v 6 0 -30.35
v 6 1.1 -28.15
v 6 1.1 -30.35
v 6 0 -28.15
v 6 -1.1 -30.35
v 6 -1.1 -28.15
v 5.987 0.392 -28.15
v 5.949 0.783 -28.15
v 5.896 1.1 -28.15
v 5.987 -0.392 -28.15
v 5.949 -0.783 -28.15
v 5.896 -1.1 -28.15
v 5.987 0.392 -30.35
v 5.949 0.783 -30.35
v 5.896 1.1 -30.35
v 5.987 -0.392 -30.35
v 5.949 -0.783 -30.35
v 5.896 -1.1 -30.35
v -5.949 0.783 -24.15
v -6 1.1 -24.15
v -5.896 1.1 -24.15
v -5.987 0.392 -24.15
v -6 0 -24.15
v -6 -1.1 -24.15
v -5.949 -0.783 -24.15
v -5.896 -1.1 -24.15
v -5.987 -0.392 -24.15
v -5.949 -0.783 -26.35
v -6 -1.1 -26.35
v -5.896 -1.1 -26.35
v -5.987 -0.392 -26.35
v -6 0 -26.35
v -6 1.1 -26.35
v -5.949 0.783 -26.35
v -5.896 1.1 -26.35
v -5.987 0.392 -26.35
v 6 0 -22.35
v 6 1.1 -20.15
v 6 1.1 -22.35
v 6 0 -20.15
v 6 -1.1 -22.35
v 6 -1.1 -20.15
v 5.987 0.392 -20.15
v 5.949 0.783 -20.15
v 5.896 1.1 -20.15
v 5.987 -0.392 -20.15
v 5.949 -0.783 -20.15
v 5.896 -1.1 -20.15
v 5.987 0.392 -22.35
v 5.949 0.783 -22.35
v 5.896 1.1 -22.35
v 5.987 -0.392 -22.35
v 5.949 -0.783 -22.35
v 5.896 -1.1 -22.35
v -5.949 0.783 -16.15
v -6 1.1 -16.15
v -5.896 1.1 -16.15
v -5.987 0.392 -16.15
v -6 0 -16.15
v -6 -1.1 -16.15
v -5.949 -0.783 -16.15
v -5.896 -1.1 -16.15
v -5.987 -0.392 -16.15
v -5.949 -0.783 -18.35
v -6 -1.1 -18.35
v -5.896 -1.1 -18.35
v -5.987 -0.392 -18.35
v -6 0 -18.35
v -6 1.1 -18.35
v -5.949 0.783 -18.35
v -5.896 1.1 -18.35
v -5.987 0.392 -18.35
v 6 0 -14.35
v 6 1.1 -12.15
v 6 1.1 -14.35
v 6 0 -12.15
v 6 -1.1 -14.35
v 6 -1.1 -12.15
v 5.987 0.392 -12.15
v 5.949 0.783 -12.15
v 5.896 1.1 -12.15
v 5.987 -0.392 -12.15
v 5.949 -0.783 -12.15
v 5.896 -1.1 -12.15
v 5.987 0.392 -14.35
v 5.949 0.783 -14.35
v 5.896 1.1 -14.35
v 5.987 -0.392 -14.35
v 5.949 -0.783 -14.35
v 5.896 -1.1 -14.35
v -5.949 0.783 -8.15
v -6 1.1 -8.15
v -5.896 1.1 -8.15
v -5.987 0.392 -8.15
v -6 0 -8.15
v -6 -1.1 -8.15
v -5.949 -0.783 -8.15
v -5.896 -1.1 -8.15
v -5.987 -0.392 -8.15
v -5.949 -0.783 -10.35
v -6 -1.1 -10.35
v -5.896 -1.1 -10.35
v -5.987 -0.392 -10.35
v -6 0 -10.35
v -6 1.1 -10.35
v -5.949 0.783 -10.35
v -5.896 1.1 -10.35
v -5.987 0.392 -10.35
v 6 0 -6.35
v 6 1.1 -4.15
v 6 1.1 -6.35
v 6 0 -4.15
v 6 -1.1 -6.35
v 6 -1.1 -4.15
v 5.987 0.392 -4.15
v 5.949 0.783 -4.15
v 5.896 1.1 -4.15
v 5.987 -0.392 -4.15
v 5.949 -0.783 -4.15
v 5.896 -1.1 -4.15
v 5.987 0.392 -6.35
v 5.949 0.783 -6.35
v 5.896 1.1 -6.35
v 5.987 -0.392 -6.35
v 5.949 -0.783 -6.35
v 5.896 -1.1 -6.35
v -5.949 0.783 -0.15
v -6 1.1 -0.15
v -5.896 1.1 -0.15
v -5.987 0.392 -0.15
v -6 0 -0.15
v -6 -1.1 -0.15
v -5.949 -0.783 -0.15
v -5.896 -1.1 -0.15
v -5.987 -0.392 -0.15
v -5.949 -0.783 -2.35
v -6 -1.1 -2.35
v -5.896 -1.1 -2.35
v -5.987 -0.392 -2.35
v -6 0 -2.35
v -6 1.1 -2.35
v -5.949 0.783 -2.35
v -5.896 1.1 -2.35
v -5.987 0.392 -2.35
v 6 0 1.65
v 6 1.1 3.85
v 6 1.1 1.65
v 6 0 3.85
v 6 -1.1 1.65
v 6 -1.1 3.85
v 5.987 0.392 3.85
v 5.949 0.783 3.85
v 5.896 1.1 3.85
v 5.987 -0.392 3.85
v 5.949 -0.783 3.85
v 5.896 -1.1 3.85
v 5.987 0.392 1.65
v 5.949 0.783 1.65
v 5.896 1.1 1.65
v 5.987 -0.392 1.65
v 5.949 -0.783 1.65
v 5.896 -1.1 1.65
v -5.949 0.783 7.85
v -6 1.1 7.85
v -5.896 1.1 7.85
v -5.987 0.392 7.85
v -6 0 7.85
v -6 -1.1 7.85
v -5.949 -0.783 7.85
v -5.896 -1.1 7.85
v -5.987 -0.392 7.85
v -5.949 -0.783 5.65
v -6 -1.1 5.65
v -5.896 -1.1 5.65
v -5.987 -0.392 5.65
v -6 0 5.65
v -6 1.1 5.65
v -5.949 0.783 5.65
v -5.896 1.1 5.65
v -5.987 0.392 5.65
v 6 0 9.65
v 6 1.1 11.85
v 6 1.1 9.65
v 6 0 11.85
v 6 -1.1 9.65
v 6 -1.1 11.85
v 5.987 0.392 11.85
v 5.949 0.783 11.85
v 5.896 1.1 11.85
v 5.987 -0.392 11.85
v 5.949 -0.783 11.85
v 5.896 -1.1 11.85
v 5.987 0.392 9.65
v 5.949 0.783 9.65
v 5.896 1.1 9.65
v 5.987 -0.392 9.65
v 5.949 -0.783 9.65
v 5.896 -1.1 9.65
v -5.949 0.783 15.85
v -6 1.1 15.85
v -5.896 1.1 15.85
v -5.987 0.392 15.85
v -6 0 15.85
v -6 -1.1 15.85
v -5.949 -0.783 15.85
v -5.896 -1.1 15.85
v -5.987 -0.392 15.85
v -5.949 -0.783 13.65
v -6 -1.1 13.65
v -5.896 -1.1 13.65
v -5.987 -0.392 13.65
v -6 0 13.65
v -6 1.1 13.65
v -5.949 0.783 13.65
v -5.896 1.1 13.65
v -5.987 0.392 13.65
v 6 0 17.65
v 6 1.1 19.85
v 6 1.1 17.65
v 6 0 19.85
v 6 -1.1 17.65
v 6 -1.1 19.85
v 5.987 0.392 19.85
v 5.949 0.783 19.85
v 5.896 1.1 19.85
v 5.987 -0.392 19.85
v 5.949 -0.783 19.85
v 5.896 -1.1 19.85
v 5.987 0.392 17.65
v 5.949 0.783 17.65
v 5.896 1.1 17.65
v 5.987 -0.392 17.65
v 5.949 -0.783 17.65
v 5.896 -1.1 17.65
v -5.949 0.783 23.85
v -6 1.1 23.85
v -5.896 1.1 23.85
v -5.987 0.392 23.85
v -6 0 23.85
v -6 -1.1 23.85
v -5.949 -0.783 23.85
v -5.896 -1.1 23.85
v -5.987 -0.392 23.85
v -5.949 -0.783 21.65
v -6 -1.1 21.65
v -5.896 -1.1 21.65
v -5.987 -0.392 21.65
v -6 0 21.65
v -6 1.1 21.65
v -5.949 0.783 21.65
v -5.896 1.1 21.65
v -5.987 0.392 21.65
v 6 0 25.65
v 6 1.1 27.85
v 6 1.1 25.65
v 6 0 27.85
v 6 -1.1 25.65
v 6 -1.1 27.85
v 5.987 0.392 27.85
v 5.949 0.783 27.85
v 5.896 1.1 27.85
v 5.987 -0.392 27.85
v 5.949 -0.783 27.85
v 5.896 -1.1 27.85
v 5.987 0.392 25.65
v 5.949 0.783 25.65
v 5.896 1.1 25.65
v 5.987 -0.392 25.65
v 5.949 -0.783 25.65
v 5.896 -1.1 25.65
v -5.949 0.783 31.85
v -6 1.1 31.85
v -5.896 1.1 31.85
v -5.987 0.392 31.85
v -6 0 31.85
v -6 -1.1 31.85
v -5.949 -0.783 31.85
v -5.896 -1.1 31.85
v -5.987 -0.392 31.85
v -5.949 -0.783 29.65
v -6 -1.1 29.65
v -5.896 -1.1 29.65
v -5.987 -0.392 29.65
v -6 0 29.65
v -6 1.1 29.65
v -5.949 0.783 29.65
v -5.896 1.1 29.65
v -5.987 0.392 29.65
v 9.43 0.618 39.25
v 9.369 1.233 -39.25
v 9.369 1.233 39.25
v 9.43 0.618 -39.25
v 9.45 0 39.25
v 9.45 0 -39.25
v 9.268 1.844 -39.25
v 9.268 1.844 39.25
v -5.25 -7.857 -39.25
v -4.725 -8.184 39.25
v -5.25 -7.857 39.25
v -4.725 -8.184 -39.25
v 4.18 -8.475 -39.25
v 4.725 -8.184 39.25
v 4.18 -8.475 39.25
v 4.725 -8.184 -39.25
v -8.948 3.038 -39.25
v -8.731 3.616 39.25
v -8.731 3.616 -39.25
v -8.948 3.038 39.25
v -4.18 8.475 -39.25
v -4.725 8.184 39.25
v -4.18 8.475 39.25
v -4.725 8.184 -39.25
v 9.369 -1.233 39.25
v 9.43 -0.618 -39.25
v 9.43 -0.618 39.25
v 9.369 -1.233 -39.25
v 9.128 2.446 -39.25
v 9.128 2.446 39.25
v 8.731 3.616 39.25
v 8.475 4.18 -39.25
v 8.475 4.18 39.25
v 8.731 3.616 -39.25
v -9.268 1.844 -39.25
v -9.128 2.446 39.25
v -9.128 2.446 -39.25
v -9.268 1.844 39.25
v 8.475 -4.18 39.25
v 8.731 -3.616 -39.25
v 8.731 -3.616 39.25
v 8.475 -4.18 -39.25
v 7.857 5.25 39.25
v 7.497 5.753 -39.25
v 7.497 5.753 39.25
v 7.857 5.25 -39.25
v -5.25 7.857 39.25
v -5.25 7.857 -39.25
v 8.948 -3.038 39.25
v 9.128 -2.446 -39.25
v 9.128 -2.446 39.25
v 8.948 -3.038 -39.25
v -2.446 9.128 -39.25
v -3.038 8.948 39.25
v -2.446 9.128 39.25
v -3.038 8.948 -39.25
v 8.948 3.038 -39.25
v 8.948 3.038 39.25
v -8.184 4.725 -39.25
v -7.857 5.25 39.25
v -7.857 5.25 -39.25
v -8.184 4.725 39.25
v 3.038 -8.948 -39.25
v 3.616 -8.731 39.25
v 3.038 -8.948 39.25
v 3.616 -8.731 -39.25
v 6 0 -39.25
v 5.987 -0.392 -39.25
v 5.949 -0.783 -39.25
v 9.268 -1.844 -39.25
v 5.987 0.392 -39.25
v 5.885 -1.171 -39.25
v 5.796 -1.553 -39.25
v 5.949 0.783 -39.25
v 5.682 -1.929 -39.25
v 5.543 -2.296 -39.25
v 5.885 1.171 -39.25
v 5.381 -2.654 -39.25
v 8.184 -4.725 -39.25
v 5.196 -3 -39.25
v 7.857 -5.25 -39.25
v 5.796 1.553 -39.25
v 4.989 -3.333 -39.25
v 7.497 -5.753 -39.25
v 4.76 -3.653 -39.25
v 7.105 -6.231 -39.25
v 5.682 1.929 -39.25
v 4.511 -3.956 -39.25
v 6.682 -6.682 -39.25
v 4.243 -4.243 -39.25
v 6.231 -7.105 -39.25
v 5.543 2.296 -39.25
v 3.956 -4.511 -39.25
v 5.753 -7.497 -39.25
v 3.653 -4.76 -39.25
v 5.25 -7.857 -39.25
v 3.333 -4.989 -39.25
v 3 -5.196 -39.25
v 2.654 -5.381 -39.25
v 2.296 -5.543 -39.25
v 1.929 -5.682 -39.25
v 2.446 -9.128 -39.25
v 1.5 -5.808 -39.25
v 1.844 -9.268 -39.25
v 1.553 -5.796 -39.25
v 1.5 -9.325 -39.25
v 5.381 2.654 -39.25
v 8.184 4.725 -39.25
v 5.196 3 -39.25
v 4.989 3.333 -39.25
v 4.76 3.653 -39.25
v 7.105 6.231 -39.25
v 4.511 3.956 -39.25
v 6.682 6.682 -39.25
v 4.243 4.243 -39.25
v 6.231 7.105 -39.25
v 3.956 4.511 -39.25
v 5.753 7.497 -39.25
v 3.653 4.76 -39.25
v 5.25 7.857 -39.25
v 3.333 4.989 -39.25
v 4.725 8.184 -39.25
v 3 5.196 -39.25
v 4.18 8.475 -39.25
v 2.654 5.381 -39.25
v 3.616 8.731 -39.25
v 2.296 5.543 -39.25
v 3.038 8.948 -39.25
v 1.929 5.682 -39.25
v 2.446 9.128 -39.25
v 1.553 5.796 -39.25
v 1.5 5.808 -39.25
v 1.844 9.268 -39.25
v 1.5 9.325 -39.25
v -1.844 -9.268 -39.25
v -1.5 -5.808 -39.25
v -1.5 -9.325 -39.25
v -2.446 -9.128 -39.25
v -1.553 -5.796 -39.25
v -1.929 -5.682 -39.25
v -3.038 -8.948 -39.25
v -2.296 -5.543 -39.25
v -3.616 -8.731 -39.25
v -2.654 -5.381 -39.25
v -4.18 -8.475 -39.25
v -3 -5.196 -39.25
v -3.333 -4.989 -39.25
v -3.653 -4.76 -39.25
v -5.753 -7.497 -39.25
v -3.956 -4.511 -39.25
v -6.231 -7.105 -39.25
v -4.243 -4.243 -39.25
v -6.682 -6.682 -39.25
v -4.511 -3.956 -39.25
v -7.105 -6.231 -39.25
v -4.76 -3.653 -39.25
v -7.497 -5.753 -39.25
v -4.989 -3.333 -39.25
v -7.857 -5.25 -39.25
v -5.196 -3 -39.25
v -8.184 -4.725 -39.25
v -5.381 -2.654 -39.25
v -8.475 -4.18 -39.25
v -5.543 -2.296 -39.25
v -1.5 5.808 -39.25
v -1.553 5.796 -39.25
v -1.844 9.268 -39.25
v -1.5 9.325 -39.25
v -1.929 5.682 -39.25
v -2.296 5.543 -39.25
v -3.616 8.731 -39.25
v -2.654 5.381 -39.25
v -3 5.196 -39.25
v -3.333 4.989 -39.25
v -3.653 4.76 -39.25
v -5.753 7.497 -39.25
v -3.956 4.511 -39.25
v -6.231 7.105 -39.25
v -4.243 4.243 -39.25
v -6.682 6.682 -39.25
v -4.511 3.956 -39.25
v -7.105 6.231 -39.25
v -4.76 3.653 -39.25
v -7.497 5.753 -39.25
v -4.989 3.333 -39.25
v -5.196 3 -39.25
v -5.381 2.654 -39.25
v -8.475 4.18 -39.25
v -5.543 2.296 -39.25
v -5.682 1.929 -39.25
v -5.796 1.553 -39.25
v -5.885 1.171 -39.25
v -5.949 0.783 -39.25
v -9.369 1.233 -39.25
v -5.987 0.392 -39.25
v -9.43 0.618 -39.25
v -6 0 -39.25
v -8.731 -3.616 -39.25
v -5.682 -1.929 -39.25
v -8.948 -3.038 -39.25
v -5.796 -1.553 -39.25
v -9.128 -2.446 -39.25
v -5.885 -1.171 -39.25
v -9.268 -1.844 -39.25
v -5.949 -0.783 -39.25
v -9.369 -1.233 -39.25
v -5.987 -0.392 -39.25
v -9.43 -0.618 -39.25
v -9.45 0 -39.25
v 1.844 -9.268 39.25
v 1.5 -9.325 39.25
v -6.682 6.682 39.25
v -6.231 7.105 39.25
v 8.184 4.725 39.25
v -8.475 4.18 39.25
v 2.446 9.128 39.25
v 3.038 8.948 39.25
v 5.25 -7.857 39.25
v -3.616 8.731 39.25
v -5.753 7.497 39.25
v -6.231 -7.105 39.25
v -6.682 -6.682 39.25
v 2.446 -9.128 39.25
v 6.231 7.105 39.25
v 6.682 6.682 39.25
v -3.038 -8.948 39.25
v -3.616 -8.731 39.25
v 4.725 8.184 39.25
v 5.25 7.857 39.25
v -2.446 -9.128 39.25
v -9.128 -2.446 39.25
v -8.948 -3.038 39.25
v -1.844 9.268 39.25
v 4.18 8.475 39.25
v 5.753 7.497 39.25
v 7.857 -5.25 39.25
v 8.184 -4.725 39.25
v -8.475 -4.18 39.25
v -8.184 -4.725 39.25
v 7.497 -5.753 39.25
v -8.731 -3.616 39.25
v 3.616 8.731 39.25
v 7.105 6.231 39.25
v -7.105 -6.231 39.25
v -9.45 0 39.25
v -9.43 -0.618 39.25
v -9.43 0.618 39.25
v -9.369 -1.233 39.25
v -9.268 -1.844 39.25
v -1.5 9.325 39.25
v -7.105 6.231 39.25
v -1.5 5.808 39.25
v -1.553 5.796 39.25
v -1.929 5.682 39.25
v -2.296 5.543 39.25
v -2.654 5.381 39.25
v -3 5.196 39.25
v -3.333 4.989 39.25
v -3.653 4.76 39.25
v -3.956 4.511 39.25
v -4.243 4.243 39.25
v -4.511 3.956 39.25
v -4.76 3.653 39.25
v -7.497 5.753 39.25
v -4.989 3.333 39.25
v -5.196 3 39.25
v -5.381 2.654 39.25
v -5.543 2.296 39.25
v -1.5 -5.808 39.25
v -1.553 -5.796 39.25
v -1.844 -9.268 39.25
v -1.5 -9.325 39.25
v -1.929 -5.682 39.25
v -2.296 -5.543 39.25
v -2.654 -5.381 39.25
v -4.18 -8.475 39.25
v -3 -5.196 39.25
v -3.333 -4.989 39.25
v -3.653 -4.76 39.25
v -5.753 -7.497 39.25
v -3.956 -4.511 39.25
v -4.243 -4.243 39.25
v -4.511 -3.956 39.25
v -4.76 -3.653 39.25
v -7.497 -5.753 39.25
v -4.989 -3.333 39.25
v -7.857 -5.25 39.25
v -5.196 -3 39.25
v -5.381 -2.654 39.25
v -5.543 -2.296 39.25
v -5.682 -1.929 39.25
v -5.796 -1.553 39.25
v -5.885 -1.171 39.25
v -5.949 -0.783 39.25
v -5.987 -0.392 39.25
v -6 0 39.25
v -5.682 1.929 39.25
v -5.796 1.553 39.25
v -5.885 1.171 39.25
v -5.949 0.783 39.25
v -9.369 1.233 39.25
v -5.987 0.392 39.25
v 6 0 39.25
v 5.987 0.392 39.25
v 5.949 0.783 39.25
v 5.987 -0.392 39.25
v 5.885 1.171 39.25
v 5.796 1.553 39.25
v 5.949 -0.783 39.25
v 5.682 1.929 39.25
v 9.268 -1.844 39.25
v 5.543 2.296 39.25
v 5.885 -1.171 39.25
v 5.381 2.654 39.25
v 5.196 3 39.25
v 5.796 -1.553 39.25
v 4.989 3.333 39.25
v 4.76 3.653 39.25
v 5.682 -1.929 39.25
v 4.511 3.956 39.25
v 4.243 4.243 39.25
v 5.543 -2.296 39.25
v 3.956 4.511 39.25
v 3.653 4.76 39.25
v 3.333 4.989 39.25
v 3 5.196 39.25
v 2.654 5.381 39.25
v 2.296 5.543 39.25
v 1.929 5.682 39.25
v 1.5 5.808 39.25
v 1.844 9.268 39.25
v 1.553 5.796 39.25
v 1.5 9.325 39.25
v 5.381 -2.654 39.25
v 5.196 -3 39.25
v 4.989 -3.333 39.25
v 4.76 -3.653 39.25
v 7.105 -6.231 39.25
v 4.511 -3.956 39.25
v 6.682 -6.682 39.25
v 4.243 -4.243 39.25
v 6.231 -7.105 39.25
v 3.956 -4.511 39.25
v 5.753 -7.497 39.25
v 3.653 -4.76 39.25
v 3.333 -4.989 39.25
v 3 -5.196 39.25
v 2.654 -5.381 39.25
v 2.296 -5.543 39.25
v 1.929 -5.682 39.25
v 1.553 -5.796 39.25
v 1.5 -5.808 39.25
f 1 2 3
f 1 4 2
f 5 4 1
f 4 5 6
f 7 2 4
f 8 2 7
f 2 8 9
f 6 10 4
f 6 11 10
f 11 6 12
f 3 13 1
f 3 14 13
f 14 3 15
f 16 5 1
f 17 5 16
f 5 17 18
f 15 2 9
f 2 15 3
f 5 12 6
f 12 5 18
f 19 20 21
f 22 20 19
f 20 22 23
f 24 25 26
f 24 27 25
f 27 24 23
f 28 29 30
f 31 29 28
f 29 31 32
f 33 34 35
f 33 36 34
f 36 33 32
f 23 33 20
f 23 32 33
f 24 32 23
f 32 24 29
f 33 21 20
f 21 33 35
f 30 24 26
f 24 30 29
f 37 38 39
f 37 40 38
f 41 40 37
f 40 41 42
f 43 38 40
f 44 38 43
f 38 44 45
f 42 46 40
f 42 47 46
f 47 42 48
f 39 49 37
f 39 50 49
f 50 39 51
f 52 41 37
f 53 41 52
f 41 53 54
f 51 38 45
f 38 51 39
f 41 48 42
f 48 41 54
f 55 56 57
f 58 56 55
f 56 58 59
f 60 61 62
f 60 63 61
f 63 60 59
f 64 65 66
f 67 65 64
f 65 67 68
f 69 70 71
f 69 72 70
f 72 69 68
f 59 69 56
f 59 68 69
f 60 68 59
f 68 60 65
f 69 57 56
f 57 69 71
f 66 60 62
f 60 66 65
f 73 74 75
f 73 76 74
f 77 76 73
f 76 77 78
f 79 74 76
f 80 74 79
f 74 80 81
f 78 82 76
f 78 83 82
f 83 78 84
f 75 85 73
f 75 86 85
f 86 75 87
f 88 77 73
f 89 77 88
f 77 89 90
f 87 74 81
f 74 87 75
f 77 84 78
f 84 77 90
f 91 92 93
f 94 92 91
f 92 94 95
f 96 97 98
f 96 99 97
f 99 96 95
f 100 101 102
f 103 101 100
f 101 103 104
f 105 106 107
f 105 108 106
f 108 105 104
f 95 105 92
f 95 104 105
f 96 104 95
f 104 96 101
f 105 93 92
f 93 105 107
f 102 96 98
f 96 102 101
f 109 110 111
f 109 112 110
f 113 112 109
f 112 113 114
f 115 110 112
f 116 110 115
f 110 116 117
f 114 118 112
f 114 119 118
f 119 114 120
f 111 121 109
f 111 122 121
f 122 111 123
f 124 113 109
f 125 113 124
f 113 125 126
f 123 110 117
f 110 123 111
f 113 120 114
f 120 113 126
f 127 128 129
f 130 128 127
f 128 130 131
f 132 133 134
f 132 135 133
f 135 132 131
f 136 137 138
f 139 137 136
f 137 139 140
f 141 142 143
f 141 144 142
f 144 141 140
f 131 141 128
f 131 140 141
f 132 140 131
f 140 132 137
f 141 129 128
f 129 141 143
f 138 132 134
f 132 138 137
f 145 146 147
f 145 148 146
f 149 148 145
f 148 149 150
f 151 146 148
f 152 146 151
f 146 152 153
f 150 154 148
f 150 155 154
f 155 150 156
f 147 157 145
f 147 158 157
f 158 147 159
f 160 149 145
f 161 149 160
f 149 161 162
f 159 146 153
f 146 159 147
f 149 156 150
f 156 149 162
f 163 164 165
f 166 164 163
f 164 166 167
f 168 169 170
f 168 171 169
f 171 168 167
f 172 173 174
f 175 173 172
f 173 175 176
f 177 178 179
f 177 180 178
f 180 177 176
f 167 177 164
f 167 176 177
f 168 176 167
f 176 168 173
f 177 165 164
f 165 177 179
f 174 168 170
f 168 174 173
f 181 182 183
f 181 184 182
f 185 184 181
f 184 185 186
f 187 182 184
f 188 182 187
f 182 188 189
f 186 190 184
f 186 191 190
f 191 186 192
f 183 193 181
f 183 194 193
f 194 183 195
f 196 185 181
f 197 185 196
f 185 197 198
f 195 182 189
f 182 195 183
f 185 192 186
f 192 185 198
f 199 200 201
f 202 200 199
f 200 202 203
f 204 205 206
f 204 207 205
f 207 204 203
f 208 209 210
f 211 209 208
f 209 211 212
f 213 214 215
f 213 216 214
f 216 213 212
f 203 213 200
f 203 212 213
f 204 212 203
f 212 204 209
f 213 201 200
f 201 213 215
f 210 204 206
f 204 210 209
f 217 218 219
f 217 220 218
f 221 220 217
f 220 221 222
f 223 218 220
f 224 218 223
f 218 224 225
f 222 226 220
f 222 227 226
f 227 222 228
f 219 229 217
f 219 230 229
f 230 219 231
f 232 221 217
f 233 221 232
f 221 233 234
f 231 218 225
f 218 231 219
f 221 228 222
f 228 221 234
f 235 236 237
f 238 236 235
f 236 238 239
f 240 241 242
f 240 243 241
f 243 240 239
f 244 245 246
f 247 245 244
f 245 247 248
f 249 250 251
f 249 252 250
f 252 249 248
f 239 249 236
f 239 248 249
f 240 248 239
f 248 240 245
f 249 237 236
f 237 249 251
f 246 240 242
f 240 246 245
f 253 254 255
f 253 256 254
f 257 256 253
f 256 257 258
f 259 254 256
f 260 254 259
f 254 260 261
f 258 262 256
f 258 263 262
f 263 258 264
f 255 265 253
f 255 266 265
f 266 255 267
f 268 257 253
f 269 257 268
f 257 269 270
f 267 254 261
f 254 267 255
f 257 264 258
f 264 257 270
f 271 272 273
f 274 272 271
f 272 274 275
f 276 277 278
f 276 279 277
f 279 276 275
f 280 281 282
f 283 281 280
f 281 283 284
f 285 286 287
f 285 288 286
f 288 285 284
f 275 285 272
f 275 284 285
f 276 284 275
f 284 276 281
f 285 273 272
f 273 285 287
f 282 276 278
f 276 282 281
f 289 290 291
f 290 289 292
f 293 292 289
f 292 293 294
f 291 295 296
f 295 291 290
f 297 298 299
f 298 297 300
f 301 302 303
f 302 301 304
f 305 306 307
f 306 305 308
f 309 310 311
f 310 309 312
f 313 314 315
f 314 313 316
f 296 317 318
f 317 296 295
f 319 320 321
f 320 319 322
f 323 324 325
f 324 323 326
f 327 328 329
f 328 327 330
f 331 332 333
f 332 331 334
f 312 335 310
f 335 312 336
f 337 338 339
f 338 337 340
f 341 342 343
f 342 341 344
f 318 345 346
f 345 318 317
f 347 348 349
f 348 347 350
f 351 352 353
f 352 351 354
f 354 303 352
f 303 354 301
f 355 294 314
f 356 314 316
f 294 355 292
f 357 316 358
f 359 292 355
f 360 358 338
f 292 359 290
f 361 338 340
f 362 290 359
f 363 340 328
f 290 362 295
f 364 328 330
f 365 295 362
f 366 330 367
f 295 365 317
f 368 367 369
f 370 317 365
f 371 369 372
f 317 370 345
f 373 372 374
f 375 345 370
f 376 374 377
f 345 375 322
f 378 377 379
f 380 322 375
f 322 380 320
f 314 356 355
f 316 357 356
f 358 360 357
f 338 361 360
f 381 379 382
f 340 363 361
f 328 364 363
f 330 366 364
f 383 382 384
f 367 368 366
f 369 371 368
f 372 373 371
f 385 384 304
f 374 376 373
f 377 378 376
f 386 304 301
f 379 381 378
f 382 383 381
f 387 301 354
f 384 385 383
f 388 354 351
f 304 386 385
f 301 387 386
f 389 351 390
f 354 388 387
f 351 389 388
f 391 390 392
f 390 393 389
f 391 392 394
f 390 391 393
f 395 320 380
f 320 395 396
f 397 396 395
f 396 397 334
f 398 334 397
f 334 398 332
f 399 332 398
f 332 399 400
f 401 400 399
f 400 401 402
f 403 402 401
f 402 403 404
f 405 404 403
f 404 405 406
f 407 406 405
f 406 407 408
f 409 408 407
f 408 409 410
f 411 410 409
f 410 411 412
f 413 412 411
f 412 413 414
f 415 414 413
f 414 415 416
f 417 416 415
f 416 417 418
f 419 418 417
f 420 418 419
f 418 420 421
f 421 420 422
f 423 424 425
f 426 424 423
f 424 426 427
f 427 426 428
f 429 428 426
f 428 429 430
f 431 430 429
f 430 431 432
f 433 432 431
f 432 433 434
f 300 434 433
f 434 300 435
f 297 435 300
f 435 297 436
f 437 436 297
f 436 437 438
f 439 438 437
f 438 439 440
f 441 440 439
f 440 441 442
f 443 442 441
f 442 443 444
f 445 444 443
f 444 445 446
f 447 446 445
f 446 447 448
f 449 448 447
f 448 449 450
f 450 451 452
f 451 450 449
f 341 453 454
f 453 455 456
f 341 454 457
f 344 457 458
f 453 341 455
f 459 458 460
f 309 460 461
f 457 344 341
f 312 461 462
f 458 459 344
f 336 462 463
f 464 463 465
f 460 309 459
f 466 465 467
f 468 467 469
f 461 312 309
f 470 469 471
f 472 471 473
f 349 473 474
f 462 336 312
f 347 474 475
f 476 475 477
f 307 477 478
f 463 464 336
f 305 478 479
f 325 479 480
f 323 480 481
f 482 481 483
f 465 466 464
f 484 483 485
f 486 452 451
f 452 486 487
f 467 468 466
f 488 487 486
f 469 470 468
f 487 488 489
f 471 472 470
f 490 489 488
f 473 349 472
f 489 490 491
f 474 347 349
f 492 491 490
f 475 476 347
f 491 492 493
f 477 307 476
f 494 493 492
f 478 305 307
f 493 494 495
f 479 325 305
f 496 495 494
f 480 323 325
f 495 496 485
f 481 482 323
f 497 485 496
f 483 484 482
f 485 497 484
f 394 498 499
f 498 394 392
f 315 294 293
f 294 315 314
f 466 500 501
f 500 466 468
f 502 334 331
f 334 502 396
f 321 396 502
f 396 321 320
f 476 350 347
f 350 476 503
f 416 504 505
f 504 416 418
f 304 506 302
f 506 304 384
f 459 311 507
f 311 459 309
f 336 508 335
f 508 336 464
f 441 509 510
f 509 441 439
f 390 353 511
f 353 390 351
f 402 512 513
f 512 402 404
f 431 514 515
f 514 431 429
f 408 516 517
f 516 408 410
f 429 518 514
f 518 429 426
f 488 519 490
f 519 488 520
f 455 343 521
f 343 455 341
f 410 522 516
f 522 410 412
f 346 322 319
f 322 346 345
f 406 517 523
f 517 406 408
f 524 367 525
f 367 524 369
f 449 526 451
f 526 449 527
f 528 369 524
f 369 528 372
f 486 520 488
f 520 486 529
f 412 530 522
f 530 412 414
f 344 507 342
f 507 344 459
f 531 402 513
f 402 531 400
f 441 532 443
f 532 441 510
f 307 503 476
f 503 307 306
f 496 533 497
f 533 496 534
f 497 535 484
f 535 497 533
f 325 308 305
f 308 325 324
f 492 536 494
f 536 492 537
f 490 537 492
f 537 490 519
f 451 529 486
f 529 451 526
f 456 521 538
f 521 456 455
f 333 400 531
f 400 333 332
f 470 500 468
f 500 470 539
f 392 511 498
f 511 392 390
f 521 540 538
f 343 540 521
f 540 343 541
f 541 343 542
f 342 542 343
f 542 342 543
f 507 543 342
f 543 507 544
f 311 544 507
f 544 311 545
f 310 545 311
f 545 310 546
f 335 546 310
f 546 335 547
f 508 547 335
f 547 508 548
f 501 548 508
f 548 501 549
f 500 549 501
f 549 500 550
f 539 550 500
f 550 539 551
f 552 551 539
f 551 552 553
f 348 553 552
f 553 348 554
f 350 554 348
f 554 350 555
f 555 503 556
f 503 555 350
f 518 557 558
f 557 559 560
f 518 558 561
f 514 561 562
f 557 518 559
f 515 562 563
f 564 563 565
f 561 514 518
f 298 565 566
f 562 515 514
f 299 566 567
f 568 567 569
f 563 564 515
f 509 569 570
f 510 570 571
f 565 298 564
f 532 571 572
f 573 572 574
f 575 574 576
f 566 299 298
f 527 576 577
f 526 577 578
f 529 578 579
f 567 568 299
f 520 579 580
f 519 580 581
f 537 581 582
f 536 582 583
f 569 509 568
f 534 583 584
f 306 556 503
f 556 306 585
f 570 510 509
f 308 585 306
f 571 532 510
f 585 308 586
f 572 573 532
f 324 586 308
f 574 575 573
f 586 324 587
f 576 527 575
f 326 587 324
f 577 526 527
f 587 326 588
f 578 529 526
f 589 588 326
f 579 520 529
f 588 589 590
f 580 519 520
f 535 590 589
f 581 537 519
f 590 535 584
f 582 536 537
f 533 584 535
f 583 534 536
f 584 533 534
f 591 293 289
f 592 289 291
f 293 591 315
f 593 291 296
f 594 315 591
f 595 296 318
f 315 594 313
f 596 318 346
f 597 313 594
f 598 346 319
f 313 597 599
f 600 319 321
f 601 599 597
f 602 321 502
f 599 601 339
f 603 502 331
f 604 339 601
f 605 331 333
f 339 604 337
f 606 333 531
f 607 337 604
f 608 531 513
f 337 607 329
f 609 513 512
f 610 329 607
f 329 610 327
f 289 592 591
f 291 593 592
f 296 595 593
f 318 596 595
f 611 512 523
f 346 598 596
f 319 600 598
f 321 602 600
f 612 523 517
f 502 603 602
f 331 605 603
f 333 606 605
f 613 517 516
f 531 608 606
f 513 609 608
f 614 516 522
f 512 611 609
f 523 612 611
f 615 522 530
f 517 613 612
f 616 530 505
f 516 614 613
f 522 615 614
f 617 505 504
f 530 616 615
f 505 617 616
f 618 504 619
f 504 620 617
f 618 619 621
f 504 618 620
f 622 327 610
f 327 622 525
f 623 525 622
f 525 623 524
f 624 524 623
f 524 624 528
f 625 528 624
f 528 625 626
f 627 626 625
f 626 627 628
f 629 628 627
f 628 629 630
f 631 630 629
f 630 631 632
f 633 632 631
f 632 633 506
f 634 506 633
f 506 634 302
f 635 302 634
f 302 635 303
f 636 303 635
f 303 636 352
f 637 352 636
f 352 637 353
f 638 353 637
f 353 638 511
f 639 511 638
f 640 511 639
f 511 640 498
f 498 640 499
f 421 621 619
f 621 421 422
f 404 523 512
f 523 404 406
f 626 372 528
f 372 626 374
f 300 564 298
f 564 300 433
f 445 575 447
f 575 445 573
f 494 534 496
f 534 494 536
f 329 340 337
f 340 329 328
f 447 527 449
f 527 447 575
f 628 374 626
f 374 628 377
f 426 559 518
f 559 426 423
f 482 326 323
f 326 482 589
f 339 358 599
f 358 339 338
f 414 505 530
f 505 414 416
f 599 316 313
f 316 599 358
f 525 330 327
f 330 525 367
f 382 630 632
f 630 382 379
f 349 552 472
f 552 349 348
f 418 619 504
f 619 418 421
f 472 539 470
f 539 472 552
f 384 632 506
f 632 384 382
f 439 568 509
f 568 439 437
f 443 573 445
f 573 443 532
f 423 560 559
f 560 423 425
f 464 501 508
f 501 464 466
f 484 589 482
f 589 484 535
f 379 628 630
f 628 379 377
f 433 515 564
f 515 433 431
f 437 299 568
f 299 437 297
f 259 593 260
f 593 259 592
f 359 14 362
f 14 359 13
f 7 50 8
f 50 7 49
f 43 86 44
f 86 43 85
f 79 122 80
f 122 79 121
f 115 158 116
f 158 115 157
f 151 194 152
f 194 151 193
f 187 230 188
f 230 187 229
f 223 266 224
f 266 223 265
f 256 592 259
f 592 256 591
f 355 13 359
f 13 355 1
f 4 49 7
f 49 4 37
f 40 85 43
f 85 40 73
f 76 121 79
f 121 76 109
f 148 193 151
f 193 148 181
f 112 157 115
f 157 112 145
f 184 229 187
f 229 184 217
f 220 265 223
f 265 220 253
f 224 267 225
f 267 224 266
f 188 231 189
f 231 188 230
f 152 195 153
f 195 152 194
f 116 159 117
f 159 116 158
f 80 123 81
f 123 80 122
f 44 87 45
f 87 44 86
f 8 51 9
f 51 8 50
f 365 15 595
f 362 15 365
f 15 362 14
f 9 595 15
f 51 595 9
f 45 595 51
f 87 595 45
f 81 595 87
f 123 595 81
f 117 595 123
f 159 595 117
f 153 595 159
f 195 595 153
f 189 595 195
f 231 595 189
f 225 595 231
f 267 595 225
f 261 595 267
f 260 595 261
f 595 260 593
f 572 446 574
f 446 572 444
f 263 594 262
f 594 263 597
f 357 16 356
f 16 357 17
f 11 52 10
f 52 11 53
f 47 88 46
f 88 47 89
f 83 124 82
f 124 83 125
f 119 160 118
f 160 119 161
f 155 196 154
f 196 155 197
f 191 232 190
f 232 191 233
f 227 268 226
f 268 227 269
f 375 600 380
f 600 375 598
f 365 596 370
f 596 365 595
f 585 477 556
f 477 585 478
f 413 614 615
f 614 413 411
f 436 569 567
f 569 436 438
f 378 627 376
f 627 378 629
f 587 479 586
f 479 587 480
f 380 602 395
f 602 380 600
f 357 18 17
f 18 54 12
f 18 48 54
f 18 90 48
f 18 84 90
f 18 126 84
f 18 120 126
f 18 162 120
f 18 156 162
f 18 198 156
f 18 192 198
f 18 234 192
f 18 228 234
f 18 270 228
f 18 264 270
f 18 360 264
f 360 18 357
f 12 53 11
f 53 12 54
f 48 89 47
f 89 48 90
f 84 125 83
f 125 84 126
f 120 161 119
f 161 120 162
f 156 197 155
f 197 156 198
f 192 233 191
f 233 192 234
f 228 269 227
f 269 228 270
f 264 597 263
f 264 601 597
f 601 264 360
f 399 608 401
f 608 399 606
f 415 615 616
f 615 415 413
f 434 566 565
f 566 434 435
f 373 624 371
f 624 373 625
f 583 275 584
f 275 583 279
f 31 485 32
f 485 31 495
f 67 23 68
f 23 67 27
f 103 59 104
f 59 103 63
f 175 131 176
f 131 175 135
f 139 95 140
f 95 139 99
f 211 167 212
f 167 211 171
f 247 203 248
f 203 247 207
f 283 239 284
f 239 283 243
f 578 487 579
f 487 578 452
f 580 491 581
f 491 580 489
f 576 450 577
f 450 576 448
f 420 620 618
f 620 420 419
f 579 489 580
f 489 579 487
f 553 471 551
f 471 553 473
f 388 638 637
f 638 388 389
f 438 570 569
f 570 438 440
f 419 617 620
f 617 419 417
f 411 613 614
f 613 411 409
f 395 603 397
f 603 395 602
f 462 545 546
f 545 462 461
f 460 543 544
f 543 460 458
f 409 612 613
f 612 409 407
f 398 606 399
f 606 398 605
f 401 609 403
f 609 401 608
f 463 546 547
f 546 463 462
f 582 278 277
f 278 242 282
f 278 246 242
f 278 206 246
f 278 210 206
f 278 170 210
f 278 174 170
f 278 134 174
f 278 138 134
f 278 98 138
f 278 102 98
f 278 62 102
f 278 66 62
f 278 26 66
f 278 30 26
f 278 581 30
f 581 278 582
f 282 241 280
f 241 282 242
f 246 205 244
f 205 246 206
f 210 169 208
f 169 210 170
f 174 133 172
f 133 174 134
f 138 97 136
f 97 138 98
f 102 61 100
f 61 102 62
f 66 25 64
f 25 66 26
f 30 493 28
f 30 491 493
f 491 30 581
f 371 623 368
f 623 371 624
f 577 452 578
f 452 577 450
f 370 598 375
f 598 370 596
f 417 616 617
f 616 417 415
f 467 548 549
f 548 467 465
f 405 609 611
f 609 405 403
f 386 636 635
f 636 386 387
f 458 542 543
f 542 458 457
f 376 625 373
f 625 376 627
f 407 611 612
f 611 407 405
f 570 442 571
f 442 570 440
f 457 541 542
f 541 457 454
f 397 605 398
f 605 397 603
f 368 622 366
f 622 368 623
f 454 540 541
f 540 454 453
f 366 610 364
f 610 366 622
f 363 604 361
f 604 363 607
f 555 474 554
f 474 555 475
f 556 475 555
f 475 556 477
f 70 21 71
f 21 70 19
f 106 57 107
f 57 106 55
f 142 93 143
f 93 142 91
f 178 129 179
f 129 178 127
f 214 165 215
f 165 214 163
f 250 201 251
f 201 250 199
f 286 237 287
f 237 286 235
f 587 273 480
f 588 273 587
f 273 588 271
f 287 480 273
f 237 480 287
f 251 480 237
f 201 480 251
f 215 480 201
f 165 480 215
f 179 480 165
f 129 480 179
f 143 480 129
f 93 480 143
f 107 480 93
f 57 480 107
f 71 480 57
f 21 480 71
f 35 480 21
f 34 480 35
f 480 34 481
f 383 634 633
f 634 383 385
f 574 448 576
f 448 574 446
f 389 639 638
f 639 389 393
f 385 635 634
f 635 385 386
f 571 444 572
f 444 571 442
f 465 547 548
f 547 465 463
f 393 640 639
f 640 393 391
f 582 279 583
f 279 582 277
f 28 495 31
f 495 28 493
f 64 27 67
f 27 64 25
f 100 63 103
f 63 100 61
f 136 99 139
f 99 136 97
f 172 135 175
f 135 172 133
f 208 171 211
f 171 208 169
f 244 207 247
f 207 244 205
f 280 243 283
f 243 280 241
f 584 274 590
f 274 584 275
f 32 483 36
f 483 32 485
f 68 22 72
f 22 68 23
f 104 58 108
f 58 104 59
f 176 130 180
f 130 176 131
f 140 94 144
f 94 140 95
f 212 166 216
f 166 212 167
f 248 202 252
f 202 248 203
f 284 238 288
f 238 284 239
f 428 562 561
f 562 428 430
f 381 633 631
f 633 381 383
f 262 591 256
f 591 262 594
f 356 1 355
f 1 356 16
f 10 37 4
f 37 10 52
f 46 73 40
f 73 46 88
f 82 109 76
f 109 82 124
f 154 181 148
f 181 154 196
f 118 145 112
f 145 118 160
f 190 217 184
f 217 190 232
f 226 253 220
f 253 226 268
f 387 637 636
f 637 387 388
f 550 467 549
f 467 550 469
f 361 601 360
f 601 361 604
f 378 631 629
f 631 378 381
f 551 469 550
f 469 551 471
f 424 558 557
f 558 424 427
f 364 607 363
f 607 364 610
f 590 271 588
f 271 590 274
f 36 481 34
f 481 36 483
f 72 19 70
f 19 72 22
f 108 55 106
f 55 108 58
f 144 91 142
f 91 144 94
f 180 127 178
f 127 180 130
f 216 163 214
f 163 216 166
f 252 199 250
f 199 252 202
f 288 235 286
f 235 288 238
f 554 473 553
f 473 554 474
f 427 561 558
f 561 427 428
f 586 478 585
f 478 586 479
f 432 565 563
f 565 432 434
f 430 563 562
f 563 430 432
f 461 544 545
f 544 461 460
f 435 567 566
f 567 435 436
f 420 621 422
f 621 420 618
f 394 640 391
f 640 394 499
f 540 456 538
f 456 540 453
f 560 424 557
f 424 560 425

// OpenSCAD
$fn=96;

bbox_x = 19.5;
bbox_y = 18.9;
H = 78.5;

OD = min(bbox_x, bbox_y);
Rout = OD/2;

ID = 12.0;
Rin = ID/2;

slit_w = 3.0;

notch_depth = 1.0;
notch_w = 2.2;
notch_z0 = 10;
notch_z1 = 68;
notch_step = 8;

module outer_body() {
    cylinder(h=H, r=Rout, center=true);
}

module inner_bore() {
    cylinder(h=H+0.4, r=Rin, center=true);
}

module axial_slit() {
    translate([0,0,0])
        cube([slit_w, 2*Rout+2, H+0.6], center=true);
}

module relief_notch(zpos, side=1) {
    // side: +1 for +X side, -1 for -X side
    translate([side*(Rin - notch_depth/2), 0, zpos])
        cube([notch_depth, notch_w, notch_w], center=true);
}

module relief_series() {
    for (z = [-H/2 + notch_z0 : notch_step : -H/2 + notch_z1]) {
        relief_notch(z, side=1);
        relief_notch(z + notch_step/2, side=-1);
    }
}

module collar() {
    difference() {
        outer_body();
        inner_bore();
        axial_slit();
        relief_series();
    }
}

collar();
